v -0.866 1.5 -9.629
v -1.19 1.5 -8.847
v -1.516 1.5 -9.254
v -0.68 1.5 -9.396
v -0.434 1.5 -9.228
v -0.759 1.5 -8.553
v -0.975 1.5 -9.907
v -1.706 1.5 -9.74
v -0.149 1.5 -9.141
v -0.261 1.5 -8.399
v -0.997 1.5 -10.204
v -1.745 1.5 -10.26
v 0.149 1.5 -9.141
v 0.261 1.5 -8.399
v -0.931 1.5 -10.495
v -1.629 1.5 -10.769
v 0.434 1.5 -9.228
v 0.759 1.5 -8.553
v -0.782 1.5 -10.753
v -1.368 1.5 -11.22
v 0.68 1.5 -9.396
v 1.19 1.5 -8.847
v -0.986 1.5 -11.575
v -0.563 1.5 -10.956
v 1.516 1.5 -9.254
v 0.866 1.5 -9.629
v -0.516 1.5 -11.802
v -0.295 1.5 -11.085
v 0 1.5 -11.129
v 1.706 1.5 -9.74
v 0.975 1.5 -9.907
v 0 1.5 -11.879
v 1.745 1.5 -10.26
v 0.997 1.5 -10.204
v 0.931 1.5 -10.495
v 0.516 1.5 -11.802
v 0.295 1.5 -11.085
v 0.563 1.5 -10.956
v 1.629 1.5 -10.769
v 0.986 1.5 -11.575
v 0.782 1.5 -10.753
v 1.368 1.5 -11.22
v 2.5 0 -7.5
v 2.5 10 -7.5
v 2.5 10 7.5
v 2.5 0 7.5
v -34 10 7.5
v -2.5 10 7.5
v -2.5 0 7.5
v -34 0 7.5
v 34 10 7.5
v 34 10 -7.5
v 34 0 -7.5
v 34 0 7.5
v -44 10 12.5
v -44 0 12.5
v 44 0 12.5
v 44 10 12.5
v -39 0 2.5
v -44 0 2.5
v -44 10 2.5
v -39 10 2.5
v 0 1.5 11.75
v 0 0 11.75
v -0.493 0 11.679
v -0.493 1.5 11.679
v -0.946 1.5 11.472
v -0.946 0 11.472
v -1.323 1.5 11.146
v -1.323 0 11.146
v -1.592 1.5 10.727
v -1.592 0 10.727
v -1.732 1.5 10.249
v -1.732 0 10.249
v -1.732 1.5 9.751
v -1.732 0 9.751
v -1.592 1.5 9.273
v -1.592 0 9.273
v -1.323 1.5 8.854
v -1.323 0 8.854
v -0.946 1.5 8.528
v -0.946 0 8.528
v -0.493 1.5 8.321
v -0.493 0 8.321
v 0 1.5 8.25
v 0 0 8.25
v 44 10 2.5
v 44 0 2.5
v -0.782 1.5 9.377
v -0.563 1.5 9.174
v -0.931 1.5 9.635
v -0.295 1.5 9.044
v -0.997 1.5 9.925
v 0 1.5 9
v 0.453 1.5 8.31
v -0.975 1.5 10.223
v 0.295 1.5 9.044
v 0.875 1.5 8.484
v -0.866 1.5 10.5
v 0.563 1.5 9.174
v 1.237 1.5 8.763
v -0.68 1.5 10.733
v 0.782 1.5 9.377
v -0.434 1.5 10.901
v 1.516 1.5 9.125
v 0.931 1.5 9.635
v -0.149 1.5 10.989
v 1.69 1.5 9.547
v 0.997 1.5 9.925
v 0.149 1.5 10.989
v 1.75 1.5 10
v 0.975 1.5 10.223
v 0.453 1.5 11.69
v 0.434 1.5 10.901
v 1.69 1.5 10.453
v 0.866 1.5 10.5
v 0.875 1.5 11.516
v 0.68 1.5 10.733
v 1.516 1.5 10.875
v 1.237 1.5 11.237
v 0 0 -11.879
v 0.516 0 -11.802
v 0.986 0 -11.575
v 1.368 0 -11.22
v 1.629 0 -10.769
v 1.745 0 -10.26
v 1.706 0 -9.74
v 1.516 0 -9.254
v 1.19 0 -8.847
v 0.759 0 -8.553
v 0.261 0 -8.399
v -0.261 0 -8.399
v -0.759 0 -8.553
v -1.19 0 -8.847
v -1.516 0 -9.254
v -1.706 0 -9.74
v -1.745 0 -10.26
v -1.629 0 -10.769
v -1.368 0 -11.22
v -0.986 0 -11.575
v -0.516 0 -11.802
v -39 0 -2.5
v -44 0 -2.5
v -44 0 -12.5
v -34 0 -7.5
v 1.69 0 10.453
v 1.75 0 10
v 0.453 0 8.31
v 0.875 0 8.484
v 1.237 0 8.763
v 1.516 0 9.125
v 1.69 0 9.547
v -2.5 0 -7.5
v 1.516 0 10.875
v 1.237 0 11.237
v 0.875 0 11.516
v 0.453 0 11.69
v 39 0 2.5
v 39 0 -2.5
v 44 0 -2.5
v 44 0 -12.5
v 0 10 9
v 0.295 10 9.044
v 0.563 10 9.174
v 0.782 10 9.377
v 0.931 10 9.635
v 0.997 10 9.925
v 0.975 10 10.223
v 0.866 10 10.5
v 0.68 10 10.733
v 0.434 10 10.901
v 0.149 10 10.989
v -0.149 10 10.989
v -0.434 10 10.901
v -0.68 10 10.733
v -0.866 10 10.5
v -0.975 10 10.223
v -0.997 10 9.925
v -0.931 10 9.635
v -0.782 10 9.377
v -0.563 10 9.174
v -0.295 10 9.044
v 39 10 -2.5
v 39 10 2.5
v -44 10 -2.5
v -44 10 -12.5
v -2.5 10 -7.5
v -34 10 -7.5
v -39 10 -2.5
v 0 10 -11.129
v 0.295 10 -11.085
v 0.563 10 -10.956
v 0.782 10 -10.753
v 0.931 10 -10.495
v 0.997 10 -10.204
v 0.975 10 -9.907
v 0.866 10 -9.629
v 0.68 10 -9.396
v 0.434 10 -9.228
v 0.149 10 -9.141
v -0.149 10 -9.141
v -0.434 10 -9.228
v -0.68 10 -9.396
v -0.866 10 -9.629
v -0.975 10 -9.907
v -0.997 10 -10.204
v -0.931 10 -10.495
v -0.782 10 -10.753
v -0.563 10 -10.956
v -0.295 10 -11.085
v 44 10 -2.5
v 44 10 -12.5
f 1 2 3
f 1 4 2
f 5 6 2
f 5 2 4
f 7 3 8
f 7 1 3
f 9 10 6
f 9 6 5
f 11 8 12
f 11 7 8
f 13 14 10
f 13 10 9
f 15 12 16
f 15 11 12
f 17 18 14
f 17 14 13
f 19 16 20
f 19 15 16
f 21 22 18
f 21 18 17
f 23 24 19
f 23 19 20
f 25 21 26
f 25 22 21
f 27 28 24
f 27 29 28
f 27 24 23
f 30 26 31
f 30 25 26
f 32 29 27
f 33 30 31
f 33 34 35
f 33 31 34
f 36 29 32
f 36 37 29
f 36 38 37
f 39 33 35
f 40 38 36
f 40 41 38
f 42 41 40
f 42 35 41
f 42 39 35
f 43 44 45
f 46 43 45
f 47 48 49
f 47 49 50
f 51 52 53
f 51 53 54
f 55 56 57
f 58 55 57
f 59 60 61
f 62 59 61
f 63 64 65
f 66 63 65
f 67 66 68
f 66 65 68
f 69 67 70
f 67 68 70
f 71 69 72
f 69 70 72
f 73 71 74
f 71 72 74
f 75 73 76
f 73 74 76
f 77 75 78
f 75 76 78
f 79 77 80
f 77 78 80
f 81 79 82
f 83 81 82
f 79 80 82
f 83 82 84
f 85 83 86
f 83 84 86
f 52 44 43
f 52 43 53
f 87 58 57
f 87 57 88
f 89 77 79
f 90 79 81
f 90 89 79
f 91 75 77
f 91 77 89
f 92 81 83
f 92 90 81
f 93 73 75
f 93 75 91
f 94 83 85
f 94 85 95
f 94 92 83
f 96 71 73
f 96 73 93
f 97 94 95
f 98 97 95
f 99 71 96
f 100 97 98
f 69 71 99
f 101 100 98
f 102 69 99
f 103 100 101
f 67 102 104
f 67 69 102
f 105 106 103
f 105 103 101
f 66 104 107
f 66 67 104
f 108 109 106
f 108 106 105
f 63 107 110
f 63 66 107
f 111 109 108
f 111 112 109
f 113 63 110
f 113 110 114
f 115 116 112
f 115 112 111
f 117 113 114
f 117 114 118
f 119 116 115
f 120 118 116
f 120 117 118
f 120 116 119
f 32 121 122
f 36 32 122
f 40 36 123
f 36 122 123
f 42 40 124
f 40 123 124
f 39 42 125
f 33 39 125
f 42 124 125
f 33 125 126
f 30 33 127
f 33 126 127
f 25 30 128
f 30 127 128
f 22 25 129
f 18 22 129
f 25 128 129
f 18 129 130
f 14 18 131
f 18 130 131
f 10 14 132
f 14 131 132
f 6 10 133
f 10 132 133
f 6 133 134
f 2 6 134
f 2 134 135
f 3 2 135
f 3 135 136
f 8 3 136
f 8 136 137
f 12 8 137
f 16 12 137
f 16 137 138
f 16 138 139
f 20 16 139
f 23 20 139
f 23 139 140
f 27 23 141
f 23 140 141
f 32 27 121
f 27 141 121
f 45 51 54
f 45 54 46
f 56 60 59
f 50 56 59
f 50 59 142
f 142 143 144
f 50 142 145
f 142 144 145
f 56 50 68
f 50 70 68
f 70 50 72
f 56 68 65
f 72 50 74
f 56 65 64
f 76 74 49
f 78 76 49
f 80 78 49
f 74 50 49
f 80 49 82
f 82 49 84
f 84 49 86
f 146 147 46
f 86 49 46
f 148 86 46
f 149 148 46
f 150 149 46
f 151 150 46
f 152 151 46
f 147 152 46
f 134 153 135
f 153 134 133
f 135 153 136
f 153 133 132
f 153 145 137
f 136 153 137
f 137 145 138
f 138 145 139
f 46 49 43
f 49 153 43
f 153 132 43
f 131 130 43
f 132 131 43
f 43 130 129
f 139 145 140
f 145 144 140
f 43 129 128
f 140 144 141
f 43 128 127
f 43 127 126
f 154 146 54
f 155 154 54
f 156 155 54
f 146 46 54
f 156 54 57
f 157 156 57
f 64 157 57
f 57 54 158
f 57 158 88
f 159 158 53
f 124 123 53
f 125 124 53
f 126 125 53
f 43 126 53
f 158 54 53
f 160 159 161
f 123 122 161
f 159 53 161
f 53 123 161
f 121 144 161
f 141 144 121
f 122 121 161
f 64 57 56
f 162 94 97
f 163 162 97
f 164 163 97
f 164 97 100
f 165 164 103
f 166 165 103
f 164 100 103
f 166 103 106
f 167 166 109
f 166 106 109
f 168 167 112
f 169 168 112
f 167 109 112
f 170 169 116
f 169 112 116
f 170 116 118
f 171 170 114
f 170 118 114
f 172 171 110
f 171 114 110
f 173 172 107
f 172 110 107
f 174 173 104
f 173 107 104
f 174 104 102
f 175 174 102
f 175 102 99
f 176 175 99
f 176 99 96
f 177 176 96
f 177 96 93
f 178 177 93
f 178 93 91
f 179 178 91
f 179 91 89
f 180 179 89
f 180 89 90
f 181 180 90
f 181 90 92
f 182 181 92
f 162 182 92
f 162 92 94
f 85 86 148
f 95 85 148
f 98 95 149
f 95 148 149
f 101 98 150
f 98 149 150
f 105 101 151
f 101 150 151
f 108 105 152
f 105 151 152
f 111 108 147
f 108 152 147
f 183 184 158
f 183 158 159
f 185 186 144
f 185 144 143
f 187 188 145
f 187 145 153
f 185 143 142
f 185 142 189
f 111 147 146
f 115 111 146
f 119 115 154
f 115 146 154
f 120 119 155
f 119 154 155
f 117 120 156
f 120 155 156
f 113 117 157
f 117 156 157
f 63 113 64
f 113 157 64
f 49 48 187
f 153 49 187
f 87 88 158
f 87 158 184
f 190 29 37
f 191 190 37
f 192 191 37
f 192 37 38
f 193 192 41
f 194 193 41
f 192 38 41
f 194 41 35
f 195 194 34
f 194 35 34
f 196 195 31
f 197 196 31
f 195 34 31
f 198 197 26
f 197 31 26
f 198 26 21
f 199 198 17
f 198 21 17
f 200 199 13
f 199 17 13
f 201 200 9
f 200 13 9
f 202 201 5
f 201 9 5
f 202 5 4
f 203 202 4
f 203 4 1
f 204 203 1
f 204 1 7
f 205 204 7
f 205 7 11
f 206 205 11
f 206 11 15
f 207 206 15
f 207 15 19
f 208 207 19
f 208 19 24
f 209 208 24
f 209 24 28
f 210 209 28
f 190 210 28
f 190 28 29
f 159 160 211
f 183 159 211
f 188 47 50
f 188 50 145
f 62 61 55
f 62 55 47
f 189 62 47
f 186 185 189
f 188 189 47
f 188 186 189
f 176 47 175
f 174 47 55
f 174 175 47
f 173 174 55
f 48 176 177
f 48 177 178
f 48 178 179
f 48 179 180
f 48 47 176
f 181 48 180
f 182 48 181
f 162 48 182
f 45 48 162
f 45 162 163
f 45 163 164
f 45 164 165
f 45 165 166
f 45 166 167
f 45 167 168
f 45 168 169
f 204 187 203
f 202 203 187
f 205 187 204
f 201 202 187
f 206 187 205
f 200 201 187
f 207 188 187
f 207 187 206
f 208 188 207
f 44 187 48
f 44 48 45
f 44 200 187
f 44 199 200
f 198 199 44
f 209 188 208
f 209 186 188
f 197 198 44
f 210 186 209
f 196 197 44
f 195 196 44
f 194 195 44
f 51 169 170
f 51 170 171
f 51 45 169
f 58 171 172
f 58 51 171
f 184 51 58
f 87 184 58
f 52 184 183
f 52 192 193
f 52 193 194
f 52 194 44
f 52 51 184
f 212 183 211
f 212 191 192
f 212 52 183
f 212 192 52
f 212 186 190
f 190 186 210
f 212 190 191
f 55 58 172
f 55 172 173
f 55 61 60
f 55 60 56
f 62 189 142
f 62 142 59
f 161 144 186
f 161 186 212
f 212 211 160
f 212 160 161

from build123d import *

# Parameters (mm, degrees)
SKETCH1_W           = 98
SKETCH1_H           = 25
BOSS_EXTRUDE1_DEPTH = 10
CUT_EXTRUDE4_DEPTH  = 10
SKETCH4_W           = 25
SKETCH4_H           = 10
CUT_EXTRUDE6_DEPTH  = 5
SKETCH5_W           = 25
SKETCH5_H           = 10
CUT_EXTRUDE7_DEPTH  = 5
SKETCH6_W           = 5
SKETCH6_H           = 10
CUT_EXTRUDE8_DEPTH  = 5
SKETCH7_W           = 5
SKETCH7_H           = 10
CUT_EXTRUDE9_DEPTH  = 5
CUT_EXTRUDE10_DEPTH = 1.5
SKETCH9_R           = 1
CUT_EXTRUDE11_DEPTH = 11.5
SKETCH10_R          = 1
CUT_EXTRUDE12_DEPTH = 19.5
SKETCH11_R          = 1.75
CUT_EXTRUDE13_DEPTH = 1.5


with BuildPart() as part:
    # Sketch1 → Boss-Extrude1 (new body)
    with BuildSketch(Plane(origin=(0, 0, 0), x_dir=(1, 0, 0), z_dir=(0, 1, 0))):
        Rectangle(SKETCH1_W, SKETCH1_H)
    extrude(amount=BOSS_EXTRUDE1_DEPTH)

    # Sketch2 → Cut-Extrude4 (cut)
    with BuildSketch(Plane(origin=(0, 10, 0), x_dir=(1, 0, 0), z_dir=(0, 1, 0))):
        Polygon((-2.5, 2.403992328), (-2.5, -7.5), (-34, -7.5), (-34, 7.5), (-2.5, 7.5), align=None)
        Polygon((2.5, 2.403992328), (2.5, 7.5), (34, 7.5), (34, -7.5), (2.5, -7.5), align=None)
    extrude(amount=-CUT_EXTRUDE4_DEPTH, mode=Mode.SUBTRACT)

    # Sketch4 → Cut-Extrude6 (cut)
    with BuildSketch(Plane.ZY.offset(49)):
        with Locations((0, 5)):
            Rectangle(SKETCH4_W, SKETCH4_H)
    extrude(amount=-CUT_EXTRUDE6_DEPTH, mode=Mode.SUBTRACT)

    # Sketch5 → Cut-Extrude7 (cut)
    with BuildSketch(Plane(origin=(49, 0, 0), x_dir=(0, 0, -1), z_dir=(1, 0, 0))):
        with Locations((0, 5)):
            Rectangle(SKETCH5_W, SKETCH5_H)
    extrude(amount=-CUT_EXTRUDE7_DEPTH, mode=Mode.SUBTRACT)

    # Sketch6 → Cut-Extrude8 (cut)
    with BuildSketch(Plane(origin=(44, 0, 0), x_dir=(0, 0, -1), z_dir=(1, 0, 0))):
        with Locations((0, 5)):
            Rectangle(SKETCH6_W, SKETCH6_H)
    extrude(amount=-CUT_EXTRUDE8_DEPTH, mode=Mode.SUBTRACT)

    # Sketch7 → Cut-Extrude9 (cut)
    with BuildSketch(Plane.ZY.offset(44)):
        with Locations((0, 5)):
            Rectangle(SKETCH7_W, SKETCH7_H)
    extrude(amount=-CUT_EXTRUDE9_DEPTH, mode=Mode.SUBTRACT)

    # Sketch8 → Cut-Extrude10 (cut)
    with BuildSketch(Plane.XZ):
        with BuildLine():
            ThreePointArc((0, 11.75), (-1.75, 10), (0, 8.25))
            Line((0, 8.25), (0, 11.75))
        make_face()
        with BuildLine():
            Line((0, 11.75), (0, 8.25))
            ThreePointArc((0, 8.25), (1.237436867, 8.762563133), (1.75, 10))
            ThreePointArc((1.75, 10), (1.237436867, 11.237436867), (0, 11.75))
        make_face()
    extrude(amount=-CUT_EXTRUDE10_DEPTH, mode=Mode.SUBTRACT)

    # Sketch9 → Cut-Extrude11 (cut)
    with BuildSketch(Plane.XZ.offset(-1.5)):
        with Locations(Location((0, 10, 0), (0, 0, 270))):
            Circle(SKETCH9_R)
    extrude(amount=-CUT_EXTRUDE11_DEPTH, mode=Mode.SUBTRACT)

    # Sketch10 → Cut-Extrude12 (cut)
    with BuildSketch(Plane.XZ):
        with Locations(Location((0, -10.129347353, 0), (0, 0, 270))):
            Circle(SKETCH10_R)
    extrude(amount=-CUT_EXTRUDE12_DEPTH, mode=Mode.SUBTRACT)

    # Sketch11 → Cut-Extrude13 (cut)
    with BuildSketch(Plane.XZ):
        with Locations(Location((0, -10.129347353, 0), (0, 0, 270))):
            Circle(SKETCH11_R)
    extrude(amount=-CUT_EXTRUDE13_DEPTH, mode=Mode.SUBTRACT)


solid = part.part
